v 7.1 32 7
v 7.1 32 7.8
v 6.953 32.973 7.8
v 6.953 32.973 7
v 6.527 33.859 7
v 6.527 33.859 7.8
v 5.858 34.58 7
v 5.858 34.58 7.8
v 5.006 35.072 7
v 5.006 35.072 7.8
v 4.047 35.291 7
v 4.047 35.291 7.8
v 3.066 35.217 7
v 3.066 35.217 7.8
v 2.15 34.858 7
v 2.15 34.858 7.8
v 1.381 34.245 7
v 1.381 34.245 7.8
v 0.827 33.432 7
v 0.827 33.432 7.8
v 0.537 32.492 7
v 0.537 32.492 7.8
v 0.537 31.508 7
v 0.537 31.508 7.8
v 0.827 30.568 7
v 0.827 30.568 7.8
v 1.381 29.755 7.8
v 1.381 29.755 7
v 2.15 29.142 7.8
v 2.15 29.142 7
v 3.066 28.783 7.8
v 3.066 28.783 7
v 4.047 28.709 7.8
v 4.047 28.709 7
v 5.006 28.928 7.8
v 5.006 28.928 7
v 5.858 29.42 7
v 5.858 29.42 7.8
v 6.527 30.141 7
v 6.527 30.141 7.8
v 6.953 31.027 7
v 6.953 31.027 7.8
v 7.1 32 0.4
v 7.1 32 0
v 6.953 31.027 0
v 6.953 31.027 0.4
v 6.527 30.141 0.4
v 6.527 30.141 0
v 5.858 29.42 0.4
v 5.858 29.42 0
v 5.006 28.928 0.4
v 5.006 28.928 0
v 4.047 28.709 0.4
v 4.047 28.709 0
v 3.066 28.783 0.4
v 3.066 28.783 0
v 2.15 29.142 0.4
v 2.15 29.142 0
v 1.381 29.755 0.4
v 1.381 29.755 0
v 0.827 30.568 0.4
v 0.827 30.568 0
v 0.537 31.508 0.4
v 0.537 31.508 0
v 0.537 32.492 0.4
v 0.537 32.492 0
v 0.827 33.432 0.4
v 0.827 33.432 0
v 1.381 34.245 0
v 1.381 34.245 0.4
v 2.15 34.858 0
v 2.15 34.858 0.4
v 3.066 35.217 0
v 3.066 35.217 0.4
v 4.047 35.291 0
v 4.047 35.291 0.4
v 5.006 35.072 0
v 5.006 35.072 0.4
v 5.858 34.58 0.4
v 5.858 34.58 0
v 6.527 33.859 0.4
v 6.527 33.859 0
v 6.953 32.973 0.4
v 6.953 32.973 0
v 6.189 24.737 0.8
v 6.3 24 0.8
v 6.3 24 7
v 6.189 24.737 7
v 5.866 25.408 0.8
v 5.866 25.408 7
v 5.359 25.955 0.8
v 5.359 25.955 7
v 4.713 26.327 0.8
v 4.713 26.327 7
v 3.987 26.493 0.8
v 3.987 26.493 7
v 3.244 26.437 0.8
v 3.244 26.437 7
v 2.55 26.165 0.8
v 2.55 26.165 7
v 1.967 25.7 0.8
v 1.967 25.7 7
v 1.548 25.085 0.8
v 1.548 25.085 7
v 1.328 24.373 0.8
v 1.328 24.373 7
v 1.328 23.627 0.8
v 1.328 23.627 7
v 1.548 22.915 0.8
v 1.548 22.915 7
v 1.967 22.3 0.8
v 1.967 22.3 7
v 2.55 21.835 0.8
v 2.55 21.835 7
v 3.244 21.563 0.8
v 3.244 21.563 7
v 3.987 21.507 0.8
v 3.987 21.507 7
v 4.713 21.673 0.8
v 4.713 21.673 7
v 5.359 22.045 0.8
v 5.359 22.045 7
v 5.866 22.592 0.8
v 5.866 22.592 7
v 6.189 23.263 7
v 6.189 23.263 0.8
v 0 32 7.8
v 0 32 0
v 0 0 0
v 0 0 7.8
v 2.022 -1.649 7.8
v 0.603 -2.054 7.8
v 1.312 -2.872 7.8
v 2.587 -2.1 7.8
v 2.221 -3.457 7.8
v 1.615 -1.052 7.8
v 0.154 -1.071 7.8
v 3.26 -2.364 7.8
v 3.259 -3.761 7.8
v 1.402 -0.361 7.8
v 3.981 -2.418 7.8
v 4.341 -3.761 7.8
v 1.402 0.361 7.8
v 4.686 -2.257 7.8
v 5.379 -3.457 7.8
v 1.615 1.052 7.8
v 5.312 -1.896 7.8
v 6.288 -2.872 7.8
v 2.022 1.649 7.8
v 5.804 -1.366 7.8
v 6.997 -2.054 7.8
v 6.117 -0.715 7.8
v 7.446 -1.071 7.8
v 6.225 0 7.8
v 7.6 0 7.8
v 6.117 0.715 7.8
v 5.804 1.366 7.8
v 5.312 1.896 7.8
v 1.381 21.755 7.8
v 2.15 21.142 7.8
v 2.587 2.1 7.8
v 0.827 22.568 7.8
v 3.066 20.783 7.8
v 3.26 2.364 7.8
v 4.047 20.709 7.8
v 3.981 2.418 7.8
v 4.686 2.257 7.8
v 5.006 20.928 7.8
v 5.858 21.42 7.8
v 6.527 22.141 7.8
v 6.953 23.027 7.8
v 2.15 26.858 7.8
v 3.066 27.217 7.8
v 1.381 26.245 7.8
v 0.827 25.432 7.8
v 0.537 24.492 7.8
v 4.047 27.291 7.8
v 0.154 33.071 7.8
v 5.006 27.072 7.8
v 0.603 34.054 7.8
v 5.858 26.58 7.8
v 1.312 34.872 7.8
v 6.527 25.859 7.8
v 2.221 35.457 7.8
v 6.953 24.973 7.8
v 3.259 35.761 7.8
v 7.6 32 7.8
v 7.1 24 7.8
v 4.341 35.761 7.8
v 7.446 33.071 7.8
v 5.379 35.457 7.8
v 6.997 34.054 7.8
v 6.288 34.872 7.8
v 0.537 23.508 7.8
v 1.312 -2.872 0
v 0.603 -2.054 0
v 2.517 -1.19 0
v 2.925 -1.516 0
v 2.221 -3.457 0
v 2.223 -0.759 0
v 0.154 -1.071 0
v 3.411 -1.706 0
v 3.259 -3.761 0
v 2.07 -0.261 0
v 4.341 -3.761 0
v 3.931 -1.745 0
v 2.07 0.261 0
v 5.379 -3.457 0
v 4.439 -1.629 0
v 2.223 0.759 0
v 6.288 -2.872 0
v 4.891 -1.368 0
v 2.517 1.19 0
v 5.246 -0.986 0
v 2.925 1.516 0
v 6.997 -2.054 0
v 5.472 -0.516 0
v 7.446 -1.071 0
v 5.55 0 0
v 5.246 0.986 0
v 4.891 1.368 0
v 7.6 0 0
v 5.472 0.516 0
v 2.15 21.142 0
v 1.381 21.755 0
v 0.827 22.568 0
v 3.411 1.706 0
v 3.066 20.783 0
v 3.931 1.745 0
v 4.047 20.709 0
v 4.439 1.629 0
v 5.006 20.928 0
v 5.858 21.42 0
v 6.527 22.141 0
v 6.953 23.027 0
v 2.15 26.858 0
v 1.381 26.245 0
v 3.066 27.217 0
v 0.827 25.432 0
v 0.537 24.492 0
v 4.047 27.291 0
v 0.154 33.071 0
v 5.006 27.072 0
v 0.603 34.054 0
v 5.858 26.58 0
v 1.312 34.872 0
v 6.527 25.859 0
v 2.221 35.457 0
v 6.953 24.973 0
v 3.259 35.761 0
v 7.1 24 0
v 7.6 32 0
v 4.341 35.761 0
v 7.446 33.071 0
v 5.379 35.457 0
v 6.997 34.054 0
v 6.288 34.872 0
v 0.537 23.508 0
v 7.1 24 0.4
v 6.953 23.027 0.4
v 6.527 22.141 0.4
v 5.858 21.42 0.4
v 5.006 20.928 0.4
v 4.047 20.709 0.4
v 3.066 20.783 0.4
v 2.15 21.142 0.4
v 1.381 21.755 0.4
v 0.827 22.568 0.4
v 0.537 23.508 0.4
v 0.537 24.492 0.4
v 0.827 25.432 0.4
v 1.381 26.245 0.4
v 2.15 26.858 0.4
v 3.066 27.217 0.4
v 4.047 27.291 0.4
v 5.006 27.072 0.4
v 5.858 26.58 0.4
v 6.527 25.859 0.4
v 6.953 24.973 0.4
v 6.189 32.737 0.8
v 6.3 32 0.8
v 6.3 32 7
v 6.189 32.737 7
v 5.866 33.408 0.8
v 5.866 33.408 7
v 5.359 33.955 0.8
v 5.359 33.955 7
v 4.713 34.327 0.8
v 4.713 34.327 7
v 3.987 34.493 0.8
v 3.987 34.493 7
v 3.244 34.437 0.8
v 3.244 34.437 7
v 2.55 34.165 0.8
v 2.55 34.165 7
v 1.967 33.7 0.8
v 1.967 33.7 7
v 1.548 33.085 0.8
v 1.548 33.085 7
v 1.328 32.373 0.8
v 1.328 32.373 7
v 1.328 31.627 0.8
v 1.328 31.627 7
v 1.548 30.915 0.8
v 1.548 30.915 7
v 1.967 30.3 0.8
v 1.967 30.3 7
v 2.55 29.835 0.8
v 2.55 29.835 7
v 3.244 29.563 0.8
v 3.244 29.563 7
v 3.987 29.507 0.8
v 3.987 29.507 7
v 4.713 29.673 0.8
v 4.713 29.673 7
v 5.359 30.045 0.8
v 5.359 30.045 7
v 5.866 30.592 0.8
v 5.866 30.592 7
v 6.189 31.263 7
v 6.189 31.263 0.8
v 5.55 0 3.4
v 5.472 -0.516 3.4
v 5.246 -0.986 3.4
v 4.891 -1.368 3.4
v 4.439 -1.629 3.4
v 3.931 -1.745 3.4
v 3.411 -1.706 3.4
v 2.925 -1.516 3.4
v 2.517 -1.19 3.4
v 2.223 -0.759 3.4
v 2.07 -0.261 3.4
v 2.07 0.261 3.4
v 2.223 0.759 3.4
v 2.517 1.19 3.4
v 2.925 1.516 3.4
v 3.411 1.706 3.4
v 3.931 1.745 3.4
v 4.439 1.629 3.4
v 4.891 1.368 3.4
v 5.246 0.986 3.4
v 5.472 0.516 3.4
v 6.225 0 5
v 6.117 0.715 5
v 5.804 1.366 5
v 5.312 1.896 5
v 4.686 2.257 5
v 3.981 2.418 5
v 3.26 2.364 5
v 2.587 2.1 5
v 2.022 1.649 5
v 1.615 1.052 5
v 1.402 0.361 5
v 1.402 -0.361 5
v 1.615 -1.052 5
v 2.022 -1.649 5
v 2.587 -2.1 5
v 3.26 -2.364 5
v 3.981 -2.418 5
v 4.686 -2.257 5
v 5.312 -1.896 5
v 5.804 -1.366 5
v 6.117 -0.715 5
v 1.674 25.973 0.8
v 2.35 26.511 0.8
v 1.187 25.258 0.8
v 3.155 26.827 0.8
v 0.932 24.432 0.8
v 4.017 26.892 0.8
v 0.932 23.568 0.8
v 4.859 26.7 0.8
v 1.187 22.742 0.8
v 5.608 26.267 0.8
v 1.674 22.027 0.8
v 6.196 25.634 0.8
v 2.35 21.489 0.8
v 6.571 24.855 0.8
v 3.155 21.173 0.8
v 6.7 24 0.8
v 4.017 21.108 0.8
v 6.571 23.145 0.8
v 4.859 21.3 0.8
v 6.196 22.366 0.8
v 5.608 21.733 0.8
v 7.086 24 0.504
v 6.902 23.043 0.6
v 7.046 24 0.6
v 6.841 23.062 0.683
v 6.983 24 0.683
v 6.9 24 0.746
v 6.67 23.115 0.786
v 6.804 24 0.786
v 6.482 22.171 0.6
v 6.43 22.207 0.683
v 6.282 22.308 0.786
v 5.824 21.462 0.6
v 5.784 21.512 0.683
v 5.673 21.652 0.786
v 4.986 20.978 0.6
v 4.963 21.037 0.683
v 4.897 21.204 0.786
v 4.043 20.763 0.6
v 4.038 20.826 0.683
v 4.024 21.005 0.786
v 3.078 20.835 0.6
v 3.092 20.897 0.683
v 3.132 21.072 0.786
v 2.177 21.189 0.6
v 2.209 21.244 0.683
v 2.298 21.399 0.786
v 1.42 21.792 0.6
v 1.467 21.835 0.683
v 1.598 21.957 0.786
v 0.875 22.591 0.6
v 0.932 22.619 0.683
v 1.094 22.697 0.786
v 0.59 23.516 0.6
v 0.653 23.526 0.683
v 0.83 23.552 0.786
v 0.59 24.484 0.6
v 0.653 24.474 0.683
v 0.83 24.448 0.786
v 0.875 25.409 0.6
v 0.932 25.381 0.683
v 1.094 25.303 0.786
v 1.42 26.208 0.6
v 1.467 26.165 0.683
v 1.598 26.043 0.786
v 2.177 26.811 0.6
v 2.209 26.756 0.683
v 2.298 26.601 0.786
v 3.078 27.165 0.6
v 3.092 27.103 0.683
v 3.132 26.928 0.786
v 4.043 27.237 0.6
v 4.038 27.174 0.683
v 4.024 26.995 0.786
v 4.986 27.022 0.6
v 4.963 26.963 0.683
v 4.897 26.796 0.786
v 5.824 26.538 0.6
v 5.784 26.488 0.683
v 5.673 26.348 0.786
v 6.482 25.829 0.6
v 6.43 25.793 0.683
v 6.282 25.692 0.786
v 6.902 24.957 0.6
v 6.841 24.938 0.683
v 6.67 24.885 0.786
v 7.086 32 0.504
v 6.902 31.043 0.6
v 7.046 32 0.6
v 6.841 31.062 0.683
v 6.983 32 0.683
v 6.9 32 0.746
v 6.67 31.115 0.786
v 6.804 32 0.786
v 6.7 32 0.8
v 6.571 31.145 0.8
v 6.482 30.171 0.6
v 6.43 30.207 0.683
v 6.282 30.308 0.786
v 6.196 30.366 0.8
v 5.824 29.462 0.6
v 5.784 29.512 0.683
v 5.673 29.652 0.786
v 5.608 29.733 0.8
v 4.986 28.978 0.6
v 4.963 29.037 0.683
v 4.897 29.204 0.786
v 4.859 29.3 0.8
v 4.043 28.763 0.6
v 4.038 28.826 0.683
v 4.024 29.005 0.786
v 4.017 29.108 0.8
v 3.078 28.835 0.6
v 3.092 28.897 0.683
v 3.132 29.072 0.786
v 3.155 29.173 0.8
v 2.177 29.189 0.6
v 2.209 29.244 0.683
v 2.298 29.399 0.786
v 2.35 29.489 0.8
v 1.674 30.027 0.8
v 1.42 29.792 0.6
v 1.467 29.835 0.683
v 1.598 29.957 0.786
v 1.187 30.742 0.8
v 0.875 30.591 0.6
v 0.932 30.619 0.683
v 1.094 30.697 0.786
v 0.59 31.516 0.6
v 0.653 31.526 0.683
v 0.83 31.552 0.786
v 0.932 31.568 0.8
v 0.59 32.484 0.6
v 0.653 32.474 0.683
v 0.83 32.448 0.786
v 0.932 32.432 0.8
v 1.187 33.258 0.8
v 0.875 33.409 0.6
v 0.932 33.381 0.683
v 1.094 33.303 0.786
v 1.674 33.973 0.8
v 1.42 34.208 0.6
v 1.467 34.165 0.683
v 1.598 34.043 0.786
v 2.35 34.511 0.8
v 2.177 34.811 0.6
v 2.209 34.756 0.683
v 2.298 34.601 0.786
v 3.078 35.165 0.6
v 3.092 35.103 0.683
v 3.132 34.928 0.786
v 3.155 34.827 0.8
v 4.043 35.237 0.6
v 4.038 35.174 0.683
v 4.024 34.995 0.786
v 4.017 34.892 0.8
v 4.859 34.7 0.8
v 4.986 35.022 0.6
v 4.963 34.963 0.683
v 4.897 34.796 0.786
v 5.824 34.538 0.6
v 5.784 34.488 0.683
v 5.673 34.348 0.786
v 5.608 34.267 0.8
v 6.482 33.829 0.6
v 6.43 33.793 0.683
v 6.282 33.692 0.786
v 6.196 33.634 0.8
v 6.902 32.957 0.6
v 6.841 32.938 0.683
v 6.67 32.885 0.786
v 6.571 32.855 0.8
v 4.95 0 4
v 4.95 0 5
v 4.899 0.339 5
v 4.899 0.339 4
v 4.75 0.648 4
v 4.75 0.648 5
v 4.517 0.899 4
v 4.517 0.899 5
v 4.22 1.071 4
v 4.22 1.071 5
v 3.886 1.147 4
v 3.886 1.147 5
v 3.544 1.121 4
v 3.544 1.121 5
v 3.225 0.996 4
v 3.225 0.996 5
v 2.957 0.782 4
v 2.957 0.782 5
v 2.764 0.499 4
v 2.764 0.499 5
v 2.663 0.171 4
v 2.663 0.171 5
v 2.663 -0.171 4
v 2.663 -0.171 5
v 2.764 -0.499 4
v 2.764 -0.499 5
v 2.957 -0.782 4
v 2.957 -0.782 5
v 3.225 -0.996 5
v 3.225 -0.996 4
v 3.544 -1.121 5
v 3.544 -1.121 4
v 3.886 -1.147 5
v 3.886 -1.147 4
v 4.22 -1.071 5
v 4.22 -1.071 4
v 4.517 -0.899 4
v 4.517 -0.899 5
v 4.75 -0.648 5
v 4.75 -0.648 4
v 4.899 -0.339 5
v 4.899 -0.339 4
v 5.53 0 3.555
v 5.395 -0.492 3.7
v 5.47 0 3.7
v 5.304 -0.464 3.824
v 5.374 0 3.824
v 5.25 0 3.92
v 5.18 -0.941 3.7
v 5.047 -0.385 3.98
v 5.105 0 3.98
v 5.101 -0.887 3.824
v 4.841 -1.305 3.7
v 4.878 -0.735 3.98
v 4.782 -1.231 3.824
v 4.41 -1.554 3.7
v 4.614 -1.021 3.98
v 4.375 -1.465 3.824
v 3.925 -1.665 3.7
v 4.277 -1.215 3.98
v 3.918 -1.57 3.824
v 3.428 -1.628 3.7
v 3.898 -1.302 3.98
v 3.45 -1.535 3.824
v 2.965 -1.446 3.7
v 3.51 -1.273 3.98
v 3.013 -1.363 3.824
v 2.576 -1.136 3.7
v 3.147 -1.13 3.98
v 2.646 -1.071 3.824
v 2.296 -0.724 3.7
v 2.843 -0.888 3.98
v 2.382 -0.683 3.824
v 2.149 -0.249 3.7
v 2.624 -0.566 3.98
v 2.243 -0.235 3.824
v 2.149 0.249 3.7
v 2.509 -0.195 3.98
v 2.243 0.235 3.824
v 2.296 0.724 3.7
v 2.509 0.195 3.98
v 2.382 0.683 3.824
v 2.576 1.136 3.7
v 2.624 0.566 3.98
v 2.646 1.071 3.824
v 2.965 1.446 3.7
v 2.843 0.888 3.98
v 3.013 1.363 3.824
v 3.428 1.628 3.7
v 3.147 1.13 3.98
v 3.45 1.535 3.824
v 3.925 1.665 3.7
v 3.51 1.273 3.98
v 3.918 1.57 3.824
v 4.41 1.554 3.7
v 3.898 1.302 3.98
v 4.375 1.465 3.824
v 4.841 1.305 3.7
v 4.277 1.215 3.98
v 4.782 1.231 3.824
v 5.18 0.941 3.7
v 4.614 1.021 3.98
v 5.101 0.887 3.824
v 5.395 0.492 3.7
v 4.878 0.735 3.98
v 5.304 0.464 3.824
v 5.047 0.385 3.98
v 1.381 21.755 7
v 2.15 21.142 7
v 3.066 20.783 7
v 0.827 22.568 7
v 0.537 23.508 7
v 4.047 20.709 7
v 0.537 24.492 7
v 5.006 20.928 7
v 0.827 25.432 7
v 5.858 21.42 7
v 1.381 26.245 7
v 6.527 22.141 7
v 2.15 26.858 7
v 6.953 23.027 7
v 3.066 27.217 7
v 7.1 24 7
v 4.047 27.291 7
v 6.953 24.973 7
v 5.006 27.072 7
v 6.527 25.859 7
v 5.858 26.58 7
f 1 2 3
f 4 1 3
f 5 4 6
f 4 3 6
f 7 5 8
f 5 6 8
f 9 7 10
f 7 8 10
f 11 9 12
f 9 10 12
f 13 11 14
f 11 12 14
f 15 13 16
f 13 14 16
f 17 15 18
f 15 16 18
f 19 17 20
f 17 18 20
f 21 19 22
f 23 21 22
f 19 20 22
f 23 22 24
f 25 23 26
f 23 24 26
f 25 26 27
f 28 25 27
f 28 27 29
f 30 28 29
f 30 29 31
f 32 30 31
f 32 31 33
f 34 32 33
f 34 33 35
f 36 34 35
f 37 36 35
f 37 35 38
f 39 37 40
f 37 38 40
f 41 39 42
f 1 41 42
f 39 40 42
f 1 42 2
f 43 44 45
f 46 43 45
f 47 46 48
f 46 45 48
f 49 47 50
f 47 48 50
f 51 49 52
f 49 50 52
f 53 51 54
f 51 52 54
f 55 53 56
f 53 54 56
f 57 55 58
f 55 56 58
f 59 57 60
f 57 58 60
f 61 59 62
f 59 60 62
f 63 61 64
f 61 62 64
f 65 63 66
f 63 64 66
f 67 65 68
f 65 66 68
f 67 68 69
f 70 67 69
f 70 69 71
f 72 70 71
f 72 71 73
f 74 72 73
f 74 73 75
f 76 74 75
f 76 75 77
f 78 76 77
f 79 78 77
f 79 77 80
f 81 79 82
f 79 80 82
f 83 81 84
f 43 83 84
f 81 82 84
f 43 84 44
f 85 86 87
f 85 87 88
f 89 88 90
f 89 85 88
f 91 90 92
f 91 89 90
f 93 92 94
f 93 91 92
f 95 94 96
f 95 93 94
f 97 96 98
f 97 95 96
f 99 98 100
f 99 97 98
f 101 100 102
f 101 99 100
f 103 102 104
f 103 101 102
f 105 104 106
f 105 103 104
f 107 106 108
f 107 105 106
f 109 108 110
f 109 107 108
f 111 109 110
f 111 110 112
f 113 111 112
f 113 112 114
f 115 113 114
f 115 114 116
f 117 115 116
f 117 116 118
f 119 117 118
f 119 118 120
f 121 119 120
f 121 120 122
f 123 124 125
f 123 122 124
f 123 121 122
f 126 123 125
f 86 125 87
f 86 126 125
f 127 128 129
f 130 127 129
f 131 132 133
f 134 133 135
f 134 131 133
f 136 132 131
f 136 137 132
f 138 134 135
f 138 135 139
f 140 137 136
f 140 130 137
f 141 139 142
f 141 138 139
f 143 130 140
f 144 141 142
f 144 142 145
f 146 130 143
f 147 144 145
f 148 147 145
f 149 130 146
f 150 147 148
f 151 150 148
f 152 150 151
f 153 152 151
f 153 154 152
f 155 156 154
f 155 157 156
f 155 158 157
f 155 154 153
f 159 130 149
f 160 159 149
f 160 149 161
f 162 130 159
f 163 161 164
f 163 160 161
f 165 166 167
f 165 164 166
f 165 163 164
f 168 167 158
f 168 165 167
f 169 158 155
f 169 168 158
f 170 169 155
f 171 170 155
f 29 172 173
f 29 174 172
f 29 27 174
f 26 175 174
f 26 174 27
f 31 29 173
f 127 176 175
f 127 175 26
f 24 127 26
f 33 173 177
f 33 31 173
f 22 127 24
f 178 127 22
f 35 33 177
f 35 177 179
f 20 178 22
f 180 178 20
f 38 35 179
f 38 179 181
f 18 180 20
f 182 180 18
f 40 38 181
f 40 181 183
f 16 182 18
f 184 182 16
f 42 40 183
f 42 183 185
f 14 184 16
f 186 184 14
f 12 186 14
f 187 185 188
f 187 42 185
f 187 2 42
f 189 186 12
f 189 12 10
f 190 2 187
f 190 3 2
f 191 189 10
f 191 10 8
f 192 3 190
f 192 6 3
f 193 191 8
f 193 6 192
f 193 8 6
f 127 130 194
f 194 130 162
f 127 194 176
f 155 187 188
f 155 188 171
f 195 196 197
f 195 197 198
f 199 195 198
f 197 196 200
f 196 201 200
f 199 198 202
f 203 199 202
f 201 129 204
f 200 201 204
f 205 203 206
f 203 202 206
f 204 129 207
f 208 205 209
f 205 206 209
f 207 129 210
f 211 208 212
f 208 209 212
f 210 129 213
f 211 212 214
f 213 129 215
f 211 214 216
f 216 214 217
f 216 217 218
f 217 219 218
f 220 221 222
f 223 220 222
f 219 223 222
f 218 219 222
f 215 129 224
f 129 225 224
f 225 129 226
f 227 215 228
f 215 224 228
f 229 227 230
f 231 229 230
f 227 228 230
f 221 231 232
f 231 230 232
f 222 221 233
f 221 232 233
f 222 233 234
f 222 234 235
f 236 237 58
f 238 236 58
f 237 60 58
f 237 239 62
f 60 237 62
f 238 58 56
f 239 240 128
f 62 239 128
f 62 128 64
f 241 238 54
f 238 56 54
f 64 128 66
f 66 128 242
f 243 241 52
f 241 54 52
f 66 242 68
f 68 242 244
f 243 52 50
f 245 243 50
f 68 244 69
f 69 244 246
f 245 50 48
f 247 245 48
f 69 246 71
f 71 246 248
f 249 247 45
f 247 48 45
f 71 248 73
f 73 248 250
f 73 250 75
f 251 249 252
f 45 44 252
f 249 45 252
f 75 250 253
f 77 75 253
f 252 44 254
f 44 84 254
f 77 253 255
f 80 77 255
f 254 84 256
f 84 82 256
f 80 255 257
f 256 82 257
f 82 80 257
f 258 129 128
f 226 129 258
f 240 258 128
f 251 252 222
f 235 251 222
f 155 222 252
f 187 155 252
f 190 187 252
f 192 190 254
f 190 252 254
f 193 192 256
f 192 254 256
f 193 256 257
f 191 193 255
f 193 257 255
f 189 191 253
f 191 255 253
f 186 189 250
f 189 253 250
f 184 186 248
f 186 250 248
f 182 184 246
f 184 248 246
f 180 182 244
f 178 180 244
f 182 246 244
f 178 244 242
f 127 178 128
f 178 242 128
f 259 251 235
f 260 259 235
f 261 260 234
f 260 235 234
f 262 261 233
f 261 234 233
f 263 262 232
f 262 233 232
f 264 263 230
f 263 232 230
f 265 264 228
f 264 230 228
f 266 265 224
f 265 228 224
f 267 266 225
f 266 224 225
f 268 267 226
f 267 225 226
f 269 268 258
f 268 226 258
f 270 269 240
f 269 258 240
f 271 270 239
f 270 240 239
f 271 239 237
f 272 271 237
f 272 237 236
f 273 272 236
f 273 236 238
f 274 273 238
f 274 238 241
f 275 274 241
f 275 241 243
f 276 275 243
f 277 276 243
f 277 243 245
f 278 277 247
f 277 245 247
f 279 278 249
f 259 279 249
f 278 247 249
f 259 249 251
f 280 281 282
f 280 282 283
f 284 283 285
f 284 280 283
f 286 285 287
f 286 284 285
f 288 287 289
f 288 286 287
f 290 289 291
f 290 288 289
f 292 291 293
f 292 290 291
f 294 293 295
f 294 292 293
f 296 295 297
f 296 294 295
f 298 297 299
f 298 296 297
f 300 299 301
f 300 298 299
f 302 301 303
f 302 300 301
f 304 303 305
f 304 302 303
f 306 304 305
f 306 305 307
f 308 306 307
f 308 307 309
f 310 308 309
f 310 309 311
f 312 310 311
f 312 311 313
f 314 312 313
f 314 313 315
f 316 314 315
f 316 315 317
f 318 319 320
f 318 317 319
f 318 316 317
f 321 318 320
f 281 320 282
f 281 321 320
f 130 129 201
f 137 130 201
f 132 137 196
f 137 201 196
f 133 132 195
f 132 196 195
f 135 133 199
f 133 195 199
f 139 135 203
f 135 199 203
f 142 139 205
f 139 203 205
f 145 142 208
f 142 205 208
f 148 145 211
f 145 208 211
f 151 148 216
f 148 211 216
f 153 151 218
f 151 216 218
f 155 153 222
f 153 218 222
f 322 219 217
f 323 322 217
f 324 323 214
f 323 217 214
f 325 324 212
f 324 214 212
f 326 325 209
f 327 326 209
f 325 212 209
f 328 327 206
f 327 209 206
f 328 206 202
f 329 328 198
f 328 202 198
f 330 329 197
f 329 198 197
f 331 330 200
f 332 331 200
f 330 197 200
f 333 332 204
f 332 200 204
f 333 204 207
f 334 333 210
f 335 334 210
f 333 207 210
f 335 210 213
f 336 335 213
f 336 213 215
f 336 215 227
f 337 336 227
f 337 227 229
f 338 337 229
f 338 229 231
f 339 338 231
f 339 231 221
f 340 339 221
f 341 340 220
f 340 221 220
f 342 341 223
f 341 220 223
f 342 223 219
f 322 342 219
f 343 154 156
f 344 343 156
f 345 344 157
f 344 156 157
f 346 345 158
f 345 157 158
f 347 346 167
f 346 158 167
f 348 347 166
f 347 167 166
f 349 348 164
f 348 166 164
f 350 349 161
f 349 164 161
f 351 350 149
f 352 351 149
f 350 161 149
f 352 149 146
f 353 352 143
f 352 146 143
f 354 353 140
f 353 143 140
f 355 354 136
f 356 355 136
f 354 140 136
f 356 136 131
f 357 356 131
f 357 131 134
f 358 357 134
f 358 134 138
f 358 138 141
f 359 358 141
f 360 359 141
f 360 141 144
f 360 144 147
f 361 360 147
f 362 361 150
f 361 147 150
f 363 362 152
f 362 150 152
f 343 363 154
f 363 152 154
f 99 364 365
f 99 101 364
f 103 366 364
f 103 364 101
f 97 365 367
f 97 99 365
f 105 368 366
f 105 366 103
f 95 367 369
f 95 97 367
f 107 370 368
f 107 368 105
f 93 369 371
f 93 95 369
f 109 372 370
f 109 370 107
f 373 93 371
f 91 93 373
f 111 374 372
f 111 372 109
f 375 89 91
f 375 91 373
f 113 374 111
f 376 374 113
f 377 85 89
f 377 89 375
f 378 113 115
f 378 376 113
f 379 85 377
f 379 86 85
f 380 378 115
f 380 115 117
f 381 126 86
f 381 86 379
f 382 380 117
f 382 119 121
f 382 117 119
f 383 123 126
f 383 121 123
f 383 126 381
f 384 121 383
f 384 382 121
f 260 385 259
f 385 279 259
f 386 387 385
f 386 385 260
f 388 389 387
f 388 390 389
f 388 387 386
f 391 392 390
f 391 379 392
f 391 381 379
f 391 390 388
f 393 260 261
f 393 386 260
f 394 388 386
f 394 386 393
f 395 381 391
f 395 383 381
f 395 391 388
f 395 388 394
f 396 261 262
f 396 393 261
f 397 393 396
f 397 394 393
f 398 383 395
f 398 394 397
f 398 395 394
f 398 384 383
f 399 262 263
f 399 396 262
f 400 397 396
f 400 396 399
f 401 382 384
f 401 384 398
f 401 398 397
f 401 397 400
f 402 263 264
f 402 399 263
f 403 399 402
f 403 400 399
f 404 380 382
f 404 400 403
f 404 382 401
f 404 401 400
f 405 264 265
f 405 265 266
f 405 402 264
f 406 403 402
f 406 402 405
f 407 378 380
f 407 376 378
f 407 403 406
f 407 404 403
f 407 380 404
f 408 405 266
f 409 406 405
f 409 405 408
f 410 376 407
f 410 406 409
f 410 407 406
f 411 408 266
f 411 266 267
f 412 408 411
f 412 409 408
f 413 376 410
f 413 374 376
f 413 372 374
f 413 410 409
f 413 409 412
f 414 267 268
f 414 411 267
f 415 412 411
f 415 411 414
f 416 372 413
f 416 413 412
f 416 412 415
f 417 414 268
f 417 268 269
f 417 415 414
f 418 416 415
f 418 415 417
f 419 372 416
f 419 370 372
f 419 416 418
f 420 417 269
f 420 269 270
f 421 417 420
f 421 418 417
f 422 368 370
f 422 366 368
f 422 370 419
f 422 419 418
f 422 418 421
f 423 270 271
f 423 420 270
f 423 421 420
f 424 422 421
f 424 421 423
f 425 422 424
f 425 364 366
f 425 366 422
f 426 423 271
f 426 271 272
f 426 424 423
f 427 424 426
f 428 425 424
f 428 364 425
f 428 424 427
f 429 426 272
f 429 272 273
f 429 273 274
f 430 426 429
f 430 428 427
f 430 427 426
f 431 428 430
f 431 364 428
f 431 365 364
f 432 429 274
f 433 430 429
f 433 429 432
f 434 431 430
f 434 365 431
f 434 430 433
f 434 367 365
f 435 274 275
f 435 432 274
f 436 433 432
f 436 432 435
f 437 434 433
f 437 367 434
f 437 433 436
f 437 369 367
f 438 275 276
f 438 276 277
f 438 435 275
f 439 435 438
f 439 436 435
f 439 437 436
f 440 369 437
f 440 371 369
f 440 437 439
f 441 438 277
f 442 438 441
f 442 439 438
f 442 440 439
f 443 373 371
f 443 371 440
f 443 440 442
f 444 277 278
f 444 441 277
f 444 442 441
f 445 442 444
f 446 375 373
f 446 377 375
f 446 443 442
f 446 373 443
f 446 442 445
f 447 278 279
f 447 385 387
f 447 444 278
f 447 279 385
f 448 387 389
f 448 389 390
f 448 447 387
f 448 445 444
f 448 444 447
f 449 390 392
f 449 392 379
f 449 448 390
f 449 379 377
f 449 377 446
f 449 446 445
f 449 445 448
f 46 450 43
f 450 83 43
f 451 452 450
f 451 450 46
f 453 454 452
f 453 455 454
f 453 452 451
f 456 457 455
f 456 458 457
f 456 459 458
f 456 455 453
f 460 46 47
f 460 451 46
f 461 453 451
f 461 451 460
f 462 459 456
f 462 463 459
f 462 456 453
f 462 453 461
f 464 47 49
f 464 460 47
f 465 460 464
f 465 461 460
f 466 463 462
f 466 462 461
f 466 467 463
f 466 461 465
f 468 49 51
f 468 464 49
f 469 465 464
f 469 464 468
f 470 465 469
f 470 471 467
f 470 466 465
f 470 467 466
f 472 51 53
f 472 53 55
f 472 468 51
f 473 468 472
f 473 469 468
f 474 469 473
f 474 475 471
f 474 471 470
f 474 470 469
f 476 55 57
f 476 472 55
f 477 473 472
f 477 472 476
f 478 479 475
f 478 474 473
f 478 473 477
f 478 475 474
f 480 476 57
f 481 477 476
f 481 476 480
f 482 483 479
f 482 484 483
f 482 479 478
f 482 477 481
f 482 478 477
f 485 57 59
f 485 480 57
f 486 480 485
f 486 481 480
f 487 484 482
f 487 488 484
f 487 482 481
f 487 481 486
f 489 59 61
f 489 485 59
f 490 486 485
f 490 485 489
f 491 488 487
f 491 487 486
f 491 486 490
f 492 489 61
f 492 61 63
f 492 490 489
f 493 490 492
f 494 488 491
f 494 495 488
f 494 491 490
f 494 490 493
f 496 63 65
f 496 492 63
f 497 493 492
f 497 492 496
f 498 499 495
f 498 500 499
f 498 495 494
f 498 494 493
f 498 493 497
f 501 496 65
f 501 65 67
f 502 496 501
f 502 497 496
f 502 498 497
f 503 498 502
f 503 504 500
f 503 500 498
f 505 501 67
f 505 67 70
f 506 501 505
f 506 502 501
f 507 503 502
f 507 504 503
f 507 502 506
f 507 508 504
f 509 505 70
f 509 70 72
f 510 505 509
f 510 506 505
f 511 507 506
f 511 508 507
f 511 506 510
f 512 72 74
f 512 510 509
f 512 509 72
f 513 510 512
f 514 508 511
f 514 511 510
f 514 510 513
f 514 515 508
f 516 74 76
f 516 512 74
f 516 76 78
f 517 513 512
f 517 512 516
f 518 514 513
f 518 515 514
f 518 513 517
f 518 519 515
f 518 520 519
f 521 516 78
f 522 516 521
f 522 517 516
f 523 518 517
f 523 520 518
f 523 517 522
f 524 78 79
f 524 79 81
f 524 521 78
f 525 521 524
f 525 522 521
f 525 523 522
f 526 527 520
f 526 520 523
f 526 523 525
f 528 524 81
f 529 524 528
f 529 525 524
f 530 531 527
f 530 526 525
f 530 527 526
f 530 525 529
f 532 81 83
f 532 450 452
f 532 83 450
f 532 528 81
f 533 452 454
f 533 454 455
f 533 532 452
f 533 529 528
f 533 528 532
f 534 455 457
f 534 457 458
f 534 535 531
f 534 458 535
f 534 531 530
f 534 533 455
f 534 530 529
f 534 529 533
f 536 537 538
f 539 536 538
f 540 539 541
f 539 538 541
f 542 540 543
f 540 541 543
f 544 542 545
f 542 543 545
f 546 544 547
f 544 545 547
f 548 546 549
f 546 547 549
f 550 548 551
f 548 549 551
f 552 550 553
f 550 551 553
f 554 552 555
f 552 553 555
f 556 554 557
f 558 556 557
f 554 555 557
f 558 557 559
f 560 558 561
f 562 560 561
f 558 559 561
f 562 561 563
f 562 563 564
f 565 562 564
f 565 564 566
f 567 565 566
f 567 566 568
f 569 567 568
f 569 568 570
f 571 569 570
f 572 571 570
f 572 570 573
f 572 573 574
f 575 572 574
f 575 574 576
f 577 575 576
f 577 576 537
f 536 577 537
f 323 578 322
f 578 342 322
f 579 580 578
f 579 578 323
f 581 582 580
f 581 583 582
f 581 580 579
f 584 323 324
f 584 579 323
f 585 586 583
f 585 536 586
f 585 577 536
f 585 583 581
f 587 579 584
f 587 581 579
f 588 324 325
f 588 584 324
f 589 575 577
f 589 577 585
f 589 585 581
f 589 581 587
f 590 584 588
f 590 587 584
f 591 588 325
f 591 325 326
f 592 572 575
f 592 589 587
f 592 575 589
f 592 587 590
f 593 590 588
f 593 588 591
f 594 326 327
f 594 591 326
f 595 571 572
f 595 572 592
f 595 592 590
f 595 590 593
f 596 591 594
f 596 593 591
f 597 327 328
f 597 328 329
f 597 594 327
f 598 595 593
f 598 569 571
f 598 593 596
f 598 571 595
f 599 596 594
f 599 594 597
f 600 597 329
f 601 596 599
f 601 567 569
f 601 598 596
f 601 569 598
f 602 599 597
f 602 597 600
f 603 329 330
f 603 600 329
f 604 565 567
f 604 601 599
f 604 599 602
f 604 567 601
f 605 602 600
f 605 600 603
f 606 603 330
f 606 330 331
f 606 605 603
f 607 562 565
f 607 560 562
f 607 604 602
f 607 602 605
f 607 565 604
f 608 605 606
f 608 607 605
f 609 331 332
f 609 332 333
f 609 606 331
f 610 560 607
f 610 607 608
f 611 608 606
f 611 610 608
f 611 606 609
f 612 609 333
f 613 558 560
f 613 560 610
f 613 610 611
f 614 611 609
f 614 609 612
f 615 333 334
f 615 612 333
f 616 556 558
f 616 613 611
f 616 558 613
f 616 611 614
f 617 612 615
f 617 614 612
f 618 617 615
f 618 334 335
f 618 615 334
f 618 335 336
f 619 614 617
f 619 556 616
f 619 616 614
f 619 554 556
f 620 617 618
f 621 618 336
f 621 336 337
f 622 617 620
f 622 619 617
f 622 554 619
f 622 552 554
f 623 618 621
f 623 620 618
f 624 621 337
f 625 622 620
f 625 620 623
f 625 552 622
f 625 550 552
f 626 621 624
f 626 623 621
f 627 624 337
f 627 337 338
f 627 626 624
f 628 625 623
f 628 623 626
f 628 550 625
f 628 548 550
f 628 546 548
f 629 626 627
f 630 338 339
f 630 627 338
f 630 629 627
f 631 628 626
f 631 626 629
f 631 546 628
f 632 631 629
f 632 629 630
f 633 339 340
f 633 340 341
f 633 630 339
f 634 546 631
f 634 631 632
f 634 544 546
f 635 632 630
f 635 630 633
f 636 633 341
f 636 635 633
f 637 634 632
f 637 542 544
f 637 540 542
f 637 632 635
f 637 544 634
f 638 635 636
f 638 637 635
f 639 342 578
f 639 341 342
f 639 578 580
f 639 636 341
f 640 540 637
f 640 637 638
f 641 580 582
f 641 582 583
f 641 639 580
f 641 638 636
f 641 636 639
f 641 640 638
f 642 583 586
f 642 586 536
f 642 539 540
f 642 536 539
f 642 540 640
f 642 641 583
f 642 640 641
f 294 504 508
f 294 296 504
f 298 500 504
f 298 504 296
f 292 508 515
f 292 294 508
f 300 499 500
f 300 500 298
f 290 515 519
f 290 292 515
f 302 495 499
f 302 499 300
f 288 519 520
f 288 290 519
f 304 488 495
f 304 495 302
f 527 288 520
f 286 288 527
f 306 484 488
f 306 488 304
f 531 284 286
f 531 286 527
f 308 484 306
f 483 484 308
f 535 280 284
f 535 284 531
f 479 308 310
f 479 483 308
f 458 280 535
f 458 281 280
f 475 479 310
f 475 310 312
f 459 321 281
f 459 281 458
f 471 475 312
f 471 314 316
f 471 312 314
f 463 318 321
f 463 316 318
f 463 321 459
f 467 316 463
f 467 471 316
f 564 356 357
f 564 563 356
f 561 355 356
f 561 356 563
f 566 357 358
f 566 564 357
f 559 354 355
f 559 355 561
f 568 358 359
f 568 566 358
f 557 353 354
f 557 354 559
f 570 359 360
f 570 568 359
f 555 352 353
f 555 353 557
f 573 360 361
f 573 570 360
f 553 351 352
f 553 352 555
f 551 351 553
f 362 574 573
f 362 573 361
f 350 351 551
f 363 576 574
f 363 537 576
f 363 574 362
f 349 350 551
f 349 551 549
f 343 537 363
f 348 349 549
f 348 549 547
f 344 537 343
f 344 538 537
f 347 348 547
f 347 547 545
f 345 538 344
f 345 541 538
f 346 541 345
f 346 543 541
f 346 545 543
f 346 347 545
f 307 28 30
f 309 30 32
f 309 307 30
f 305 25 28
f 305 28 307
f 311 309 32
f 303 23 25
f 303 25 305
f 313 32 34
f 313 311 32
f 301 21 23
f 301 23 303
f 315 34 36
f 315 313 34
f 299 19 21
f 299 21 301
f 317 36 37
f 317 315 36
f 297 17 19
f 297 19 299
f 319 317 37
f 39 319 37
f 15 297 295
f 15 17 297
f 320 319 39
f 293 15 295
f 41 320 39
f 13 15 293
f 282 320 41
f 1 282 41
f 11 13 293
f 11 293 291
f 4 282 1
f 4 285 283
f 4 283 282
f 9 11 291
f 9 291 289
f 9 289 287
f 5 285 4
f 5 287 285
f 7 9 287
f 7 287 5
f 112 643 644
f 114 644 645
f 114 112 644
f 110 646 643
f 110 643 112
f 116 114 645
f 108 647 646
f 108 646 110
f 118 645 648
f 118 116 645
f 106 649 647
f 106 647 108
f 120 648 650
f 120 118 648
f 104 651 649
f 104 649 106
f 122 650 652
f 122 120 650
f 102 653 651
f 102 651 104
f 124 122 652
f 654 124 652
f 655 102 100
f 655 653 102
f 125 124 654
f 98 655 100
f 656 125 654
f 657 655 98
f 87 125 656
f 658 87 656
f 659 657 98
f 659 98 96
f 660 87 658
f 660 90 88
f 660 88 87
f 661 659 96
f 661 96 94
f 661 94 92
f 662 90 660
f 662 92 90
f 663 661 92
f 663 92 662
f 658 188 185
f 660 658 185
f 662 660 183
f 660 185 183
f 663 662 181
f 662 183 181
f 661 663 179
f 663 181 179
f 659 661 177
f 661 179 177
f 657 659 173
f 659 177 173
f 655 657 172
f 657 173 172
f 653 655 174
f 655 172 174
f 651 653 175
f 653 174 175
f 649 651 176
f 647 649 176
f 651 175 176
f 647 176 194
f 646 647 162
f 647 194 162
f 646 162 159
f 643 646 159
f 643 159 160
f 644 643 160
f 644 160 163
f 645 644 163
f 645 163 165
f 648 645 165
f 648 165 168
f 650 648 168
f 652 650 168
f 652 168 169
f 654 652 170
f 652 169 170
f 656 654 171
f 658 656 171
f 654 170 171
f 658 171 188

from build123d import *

# Parameters (mm, degrees)
F0_R      = 2.5
F1_DEPTH  = 7.8
F2_R      = 3.3
F3_DEPTH  = 0.8
F4_R      = 3.3
F5_DEPTH  = 0.8
F6_R      = 2.425
F7_DEPTH  = 2.8
F8_R      = 1.75
F9_DEPTH  = 4
F10_R     = 1.15
F11_DEPTH = 5.001
F12_R     = 0.59999
F13_R     = 0.4


# Not quite as in the source:
# - a fillet or chamfer is up to 0.001 mm smaller than in the source, because OpenCascade refuses the exact size


with BuildPart() as f1:
    # F0 (on Top) → F1 (new body)
    with BuildSketch(Plane.XY):
        with BuildLine():
            Line((0, 32), (0, 0))
            ThreePointArc((0, 0), (3.8, -3.8), (7.6, 0))
            Line((7.6, 0), (7.6, 32))
            ThreePointArc((7.6, 32), (3.8, 35.8), (0, 32))
        make_face()
        with Locations((3.8, 24)):
            Circle(F0_R, mode=Mode.SUBTRACT)
        with Locations((3.8, 32)):
            Circle(F0_R, mode=Mode.SUBTRACT)
    extrude(amount=F1_DEPTH)

    # F2 (on face) → F3 (cut)
    with BuildSketch(Plane.XY.offset(7.8)):
        with Locations((3.8, 32)):
            Circle(F2_R)
        with Locations((3.8, 24)):
            Circle(F2_R)
    extrude(amount=-F3_DEPTH, mode=Mode.SUBTRACT)

    # F4 (on face) → F5 (cut)
    with BuildSketch(Plane(origin=(0, 0, 0), x_dir=(1, 0, 0), z_dir=(0, 0, -1))):
        with Locations((3.8, -24)):
            Circle(F4_R)
        with Locations((3.8, -32)):
            Circle(F4_R)
    extrude(amount=-F5_DEPTH, mode=Mode.SUBTRACT)

    # F6 (on face) → F7 (cut)
    with BuildSketch(Plane.XY.offset(7.8)):
        with Locations((3.8, 0)):
            Circle(F6_R)
    extrude(amount=-F7_DEPTH, mode=Mode.SUBTRACT)

    # F8 (on face) → F9 (cut)
    with BuildSketch(Plane(origin=(0, 0, 0), x_dir=(1, 0, 0), z_dir=(0, 0, -1))):
        with Locations((3.8, 0)):
            Circle(F8_R)
    extrude(amount=-F9_DEPTH, mode=Mode.SUBTRACT)

    # F10 (on face) → F11 (cut, through all)
    with BuildSketch(Plane.XY.offset(5)):
        with Locations((3.8, 0)):
            Circle(F10_R)
    extrude(amount=-F11_DEPTH, mode=Mode.SUBTRACT)

    # F12 (radius 0.6 in the source; OpenCascade refuses exactly that, so slightly less here)
    f12_edges = [f1.edges().sort_by_distance(p)[0] for p in [
        (2.05, 0, 4),
    ]]
    fillet(f12_edges, radius=F12_R)

    # F13
    f13_edges = [f1.edges().sort_by_distance(p)[0] for p in [
        (0.5, 24, 0.8),
        (0.5, 32, 0.8),
    ]]
    fillet(f13_edges, radius=F13_R)


solid = f1.part
